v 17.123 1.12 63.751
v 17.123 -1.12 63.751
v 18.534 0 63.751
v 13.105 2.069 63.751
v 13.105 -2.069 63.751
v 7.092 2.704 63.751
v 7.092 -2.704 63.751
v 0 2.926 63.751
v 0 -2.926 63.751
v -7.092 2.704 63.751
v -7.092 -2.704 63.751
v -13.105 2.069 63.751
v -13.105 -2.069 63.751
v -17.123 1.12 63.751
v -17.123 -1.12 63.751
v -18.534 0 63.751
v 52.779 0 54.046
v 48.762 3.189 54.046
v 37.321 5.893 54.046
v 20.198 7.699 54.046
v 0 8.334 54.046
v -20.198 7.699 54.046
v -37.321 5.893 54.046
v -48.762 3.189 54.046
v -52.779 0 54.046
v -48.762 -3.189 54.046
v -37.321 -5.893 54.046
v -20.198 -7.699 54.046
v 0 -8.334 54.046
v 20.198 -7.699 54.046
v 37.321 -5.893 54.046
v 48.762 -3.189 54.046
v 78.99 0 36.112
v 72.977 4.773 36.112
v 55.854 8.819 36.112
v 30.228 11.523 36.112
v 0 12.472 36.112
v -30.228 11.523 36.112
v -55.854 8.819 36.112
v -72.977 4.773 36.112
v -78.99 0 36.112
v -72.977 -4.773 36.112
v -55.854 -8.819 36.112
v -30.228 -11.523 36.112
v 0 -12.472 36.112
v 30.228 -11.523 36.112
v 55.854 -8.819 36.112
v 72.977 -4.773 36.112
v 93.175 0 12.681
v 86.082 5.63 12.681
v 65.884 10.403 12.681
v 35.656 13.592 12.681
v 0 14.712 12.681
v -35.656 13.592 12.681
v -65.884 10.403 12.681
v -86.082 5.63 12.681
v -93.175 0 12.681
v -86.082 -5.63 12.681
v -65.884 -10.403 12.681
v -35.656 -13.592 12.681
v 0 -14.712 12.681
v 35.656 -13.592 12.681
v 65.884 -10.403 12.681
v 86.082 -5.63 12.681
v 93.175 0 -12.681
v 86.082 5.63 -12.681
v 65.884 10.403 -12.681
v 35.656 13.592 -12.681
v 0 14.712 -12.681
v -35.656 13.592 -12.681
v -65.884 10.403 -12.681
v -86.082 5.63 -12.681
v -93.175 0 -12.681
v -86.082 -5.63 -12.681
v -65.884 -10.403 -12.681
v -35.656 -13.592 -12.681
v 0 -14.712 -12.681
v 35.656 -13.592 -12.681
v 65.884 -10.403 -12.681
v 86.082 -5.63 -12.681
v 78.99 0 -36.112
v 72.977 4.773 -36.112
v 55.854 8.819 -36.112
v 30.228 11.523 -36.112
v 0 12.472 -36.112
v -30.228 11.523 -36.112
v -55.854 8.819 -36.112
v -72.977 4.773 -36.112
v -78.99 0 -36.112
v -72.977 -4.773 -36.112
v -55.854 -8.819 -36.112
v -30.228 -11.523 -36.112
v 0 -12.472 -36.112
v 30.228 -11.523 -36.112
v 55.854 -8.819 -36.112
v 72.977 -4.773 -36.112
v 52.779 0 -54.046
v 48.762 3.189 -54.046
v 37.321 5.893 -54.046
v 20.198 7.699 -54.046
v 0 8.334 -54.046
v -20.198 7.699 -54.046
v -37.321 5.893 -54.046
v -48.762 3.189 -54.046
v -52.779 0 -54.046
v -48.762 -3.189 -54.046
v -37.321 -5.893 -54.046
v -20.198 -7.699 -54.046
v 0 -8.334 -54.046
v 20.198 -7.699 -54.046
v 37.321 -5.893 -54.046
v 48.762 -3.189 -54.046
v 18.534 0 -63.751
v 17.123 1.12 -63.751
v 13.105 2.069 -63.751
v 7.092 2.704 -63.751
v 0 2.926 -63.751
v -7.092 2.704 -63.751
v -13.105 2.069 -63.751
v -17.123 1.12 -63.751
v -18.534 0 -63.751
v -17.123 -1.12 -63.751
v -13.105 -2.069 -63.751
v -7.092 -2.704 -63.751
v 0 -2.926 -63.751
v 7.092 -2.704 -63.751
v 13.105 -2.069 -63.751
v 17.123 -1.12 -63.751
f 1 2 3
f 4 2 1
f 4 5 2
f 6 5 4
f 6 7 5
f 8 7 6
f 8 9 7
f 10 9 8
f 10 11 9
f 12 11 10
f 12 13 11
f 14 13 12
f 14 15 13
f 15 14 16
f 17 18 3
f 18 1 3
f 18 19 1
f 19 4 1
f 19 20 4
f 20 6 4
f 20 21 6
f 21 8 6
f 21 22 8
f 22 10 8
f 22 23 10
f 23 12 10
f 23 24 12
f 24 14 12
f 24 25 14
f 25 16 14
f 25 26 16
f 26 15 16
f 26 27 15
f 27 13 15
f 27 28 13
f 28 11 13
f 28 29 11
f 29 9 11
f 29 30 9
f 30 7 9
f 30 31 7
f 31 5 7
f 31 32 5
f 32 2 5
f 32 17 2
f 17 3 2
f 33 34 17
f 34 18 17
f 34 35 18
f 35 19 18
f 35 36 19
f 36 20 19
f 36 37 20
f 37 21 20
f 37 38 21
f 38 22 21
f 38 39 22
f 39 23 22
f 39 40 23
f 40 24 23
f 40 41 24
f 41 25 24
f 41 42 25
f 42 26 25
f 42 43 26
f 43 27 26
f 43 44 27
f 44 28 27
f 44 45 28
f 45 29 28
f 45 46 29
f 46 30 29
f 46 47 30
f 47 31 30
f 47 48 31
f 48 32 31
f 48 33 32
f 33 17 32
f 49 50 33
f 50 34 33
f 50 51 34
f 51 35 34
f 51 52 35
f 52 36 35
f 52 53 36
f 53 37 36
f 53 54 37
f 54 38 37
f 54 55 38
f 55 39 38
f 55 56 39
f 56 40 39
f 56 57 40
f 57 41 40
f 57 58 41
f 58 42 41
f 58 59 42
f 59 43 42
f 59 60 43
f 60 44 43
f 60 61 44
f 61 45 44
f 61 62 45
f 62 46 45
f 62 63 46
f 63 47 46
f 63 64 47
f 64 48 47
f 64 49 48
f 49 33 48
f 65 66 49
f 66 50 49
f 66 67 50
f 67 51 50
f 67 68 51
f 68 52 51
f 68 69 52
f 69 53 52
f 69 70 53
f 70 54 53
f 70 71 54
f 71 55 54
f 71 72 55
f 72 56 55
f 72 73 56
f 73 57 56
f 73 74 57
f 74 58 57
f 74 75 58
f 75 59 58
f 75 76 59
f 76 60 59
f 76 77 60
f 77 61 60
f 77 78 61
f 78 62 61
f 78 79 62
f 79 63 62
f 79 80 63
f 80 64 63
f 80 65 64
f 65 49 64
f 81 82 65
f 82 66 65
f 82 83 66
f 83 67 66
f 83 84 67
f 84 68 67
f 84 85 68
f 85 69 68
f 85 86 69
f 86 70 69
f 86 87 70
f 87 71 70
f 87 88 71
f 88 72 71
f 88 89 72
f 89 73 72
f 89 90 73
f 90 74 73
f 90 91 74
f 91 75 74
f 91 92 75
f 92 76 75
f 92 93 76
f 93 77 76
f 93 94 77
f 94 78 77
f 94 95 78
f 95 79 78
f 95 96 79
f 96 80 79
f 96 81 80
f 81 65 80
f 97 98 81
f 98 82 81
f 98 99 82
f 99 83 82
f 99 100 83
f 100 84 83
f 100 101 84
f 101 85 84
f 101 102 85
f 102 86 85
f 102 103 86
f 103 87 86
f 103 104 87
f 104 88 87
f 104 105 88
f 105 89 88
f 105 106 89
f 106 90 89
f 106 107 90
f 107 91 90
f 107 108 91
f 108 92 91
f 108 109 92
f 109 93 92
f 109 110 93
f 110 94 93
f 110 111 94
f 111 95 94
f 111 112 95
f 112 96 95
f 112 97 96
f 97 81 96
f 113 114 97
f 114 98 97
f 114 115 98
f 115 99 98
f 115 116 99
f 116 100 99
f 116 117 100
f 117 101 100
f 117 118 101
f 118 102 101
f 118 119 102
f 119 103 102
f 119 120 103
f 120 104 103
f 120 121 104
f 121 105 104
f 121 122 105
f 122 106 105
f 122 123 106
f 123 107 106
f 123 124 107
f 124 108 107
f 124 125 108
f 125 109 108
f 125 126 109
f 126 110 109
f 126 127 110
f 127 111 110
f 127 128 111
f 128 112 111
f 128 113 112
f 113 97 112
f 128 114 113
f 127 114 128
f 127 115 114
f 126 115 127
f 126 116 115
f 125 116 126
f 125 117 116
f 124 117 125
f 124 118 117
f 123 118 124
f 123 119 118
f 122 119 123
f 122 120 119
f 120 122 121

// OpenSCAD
// Generated by SolidPython 1.0.1 on 2020-07-29 00:46:53


scale(v = [19, 3, 13]) {
	sphere(r = 5);
}
/***********************************************
*********      SolidPython code:      **********
************************************************
 
# import packages: SolidPython
from solid import *
from solid.utils import *
from itertools import chain, combinations, permutations


class Resize:

    def __init__(self, scad_file):
        self.scad_file = scad_file
        #self.scad_file = import_scad(scad_file)
        # cone/cylinder param:
        self.r1 = 0
        self.r2 = 0
        self.h = 0
        # rectangular prism param:
        self.w = 0
        self.l = 0
        # ellipse param:
        self.r = 0

    # import OpenScad code (file name corresponds to shape)


    # classify shape + parameters
    def assign(self, param1, param2, param3):
        if self.scad_file == 'cone.scad':
            self.r1 = param1
            self.r2 = param2
            self.h = param3
        elif self.scad_file == 'cylinder.scad':
            self.r1 = param1
            self.r2 = param2
            self.h = param3
        elif self.scad_file == 'rectangularPrism.scad':
            self.h = param1
            self.l = param2
            self.w = param3
        else:
            self.r = param1
            self.h = param2

    # resize parameters
    def iterate(self):
        x = range(3, 20, 2)
        i = 1
        if self.scad_file == 'cone.scad':
            tempList = list(permutations(x, 2))
            for temp in tempList:
                param1 = temp[0]
                param2 = temp[1]
                filepath = 'produced_scad_files/' + 'cone' + str(param1) + '_' + str(param2) + '_' + '.scad'
                scad_render_to_file(cylinder(h=param1, r1=param2, r2=0), filepath)

        elif self.scad_file == 'cylinder.scad':
            tempList = list(permutations(x, 3))
            for temp in tempList:
                param1 = temp[0]
                param2 = temp[1]
                filepath = 'produced_scad_files/' + 'cylinder' + str(param1) + '_' + str(param2) + '_' + '.scad'
                scad_render_to_file(cylinder(h=param1, r1=param2, r2=param2), filepath)

        elif self.scad_file == 'rectangularPrism.scad':
            tempList = list(permutations(x, 3))
            for temp in tempList:
                param1 = temp[0]
                param2 = temp[1]
                param3 = temp[2]
                filepath = 'produced_scad_files/' + 'rectangularPrism' + str(param1) + '_' + str(param2) + '_' + str(
                    param3) + '.scad'
                scad_render_to_file(cube(size=(param1, param2, param3)), filepath)

        elif self.scad_file == 'ellipse.scad':
            tempList = list(permutations(x, 4))
            for temp in tempList:
                param1 = temp[0]
                param2 = temp[1]
                param3 = temp[2]
                param4 = temp[3]
                filepath = 'produced_scad_files/' + 'ellipse' + str(param1) + '_' + str(param2) + '_' + str(param3) + '_' + str(param4) + '.scad'
                scad_render_to_file(scale([param1, param2, param3])(sphere(r=param4)), filepath)

    def render_to_scadfile(self):
        scad_render_to_file(scad, 'example.scad') 
 
************************************************/
